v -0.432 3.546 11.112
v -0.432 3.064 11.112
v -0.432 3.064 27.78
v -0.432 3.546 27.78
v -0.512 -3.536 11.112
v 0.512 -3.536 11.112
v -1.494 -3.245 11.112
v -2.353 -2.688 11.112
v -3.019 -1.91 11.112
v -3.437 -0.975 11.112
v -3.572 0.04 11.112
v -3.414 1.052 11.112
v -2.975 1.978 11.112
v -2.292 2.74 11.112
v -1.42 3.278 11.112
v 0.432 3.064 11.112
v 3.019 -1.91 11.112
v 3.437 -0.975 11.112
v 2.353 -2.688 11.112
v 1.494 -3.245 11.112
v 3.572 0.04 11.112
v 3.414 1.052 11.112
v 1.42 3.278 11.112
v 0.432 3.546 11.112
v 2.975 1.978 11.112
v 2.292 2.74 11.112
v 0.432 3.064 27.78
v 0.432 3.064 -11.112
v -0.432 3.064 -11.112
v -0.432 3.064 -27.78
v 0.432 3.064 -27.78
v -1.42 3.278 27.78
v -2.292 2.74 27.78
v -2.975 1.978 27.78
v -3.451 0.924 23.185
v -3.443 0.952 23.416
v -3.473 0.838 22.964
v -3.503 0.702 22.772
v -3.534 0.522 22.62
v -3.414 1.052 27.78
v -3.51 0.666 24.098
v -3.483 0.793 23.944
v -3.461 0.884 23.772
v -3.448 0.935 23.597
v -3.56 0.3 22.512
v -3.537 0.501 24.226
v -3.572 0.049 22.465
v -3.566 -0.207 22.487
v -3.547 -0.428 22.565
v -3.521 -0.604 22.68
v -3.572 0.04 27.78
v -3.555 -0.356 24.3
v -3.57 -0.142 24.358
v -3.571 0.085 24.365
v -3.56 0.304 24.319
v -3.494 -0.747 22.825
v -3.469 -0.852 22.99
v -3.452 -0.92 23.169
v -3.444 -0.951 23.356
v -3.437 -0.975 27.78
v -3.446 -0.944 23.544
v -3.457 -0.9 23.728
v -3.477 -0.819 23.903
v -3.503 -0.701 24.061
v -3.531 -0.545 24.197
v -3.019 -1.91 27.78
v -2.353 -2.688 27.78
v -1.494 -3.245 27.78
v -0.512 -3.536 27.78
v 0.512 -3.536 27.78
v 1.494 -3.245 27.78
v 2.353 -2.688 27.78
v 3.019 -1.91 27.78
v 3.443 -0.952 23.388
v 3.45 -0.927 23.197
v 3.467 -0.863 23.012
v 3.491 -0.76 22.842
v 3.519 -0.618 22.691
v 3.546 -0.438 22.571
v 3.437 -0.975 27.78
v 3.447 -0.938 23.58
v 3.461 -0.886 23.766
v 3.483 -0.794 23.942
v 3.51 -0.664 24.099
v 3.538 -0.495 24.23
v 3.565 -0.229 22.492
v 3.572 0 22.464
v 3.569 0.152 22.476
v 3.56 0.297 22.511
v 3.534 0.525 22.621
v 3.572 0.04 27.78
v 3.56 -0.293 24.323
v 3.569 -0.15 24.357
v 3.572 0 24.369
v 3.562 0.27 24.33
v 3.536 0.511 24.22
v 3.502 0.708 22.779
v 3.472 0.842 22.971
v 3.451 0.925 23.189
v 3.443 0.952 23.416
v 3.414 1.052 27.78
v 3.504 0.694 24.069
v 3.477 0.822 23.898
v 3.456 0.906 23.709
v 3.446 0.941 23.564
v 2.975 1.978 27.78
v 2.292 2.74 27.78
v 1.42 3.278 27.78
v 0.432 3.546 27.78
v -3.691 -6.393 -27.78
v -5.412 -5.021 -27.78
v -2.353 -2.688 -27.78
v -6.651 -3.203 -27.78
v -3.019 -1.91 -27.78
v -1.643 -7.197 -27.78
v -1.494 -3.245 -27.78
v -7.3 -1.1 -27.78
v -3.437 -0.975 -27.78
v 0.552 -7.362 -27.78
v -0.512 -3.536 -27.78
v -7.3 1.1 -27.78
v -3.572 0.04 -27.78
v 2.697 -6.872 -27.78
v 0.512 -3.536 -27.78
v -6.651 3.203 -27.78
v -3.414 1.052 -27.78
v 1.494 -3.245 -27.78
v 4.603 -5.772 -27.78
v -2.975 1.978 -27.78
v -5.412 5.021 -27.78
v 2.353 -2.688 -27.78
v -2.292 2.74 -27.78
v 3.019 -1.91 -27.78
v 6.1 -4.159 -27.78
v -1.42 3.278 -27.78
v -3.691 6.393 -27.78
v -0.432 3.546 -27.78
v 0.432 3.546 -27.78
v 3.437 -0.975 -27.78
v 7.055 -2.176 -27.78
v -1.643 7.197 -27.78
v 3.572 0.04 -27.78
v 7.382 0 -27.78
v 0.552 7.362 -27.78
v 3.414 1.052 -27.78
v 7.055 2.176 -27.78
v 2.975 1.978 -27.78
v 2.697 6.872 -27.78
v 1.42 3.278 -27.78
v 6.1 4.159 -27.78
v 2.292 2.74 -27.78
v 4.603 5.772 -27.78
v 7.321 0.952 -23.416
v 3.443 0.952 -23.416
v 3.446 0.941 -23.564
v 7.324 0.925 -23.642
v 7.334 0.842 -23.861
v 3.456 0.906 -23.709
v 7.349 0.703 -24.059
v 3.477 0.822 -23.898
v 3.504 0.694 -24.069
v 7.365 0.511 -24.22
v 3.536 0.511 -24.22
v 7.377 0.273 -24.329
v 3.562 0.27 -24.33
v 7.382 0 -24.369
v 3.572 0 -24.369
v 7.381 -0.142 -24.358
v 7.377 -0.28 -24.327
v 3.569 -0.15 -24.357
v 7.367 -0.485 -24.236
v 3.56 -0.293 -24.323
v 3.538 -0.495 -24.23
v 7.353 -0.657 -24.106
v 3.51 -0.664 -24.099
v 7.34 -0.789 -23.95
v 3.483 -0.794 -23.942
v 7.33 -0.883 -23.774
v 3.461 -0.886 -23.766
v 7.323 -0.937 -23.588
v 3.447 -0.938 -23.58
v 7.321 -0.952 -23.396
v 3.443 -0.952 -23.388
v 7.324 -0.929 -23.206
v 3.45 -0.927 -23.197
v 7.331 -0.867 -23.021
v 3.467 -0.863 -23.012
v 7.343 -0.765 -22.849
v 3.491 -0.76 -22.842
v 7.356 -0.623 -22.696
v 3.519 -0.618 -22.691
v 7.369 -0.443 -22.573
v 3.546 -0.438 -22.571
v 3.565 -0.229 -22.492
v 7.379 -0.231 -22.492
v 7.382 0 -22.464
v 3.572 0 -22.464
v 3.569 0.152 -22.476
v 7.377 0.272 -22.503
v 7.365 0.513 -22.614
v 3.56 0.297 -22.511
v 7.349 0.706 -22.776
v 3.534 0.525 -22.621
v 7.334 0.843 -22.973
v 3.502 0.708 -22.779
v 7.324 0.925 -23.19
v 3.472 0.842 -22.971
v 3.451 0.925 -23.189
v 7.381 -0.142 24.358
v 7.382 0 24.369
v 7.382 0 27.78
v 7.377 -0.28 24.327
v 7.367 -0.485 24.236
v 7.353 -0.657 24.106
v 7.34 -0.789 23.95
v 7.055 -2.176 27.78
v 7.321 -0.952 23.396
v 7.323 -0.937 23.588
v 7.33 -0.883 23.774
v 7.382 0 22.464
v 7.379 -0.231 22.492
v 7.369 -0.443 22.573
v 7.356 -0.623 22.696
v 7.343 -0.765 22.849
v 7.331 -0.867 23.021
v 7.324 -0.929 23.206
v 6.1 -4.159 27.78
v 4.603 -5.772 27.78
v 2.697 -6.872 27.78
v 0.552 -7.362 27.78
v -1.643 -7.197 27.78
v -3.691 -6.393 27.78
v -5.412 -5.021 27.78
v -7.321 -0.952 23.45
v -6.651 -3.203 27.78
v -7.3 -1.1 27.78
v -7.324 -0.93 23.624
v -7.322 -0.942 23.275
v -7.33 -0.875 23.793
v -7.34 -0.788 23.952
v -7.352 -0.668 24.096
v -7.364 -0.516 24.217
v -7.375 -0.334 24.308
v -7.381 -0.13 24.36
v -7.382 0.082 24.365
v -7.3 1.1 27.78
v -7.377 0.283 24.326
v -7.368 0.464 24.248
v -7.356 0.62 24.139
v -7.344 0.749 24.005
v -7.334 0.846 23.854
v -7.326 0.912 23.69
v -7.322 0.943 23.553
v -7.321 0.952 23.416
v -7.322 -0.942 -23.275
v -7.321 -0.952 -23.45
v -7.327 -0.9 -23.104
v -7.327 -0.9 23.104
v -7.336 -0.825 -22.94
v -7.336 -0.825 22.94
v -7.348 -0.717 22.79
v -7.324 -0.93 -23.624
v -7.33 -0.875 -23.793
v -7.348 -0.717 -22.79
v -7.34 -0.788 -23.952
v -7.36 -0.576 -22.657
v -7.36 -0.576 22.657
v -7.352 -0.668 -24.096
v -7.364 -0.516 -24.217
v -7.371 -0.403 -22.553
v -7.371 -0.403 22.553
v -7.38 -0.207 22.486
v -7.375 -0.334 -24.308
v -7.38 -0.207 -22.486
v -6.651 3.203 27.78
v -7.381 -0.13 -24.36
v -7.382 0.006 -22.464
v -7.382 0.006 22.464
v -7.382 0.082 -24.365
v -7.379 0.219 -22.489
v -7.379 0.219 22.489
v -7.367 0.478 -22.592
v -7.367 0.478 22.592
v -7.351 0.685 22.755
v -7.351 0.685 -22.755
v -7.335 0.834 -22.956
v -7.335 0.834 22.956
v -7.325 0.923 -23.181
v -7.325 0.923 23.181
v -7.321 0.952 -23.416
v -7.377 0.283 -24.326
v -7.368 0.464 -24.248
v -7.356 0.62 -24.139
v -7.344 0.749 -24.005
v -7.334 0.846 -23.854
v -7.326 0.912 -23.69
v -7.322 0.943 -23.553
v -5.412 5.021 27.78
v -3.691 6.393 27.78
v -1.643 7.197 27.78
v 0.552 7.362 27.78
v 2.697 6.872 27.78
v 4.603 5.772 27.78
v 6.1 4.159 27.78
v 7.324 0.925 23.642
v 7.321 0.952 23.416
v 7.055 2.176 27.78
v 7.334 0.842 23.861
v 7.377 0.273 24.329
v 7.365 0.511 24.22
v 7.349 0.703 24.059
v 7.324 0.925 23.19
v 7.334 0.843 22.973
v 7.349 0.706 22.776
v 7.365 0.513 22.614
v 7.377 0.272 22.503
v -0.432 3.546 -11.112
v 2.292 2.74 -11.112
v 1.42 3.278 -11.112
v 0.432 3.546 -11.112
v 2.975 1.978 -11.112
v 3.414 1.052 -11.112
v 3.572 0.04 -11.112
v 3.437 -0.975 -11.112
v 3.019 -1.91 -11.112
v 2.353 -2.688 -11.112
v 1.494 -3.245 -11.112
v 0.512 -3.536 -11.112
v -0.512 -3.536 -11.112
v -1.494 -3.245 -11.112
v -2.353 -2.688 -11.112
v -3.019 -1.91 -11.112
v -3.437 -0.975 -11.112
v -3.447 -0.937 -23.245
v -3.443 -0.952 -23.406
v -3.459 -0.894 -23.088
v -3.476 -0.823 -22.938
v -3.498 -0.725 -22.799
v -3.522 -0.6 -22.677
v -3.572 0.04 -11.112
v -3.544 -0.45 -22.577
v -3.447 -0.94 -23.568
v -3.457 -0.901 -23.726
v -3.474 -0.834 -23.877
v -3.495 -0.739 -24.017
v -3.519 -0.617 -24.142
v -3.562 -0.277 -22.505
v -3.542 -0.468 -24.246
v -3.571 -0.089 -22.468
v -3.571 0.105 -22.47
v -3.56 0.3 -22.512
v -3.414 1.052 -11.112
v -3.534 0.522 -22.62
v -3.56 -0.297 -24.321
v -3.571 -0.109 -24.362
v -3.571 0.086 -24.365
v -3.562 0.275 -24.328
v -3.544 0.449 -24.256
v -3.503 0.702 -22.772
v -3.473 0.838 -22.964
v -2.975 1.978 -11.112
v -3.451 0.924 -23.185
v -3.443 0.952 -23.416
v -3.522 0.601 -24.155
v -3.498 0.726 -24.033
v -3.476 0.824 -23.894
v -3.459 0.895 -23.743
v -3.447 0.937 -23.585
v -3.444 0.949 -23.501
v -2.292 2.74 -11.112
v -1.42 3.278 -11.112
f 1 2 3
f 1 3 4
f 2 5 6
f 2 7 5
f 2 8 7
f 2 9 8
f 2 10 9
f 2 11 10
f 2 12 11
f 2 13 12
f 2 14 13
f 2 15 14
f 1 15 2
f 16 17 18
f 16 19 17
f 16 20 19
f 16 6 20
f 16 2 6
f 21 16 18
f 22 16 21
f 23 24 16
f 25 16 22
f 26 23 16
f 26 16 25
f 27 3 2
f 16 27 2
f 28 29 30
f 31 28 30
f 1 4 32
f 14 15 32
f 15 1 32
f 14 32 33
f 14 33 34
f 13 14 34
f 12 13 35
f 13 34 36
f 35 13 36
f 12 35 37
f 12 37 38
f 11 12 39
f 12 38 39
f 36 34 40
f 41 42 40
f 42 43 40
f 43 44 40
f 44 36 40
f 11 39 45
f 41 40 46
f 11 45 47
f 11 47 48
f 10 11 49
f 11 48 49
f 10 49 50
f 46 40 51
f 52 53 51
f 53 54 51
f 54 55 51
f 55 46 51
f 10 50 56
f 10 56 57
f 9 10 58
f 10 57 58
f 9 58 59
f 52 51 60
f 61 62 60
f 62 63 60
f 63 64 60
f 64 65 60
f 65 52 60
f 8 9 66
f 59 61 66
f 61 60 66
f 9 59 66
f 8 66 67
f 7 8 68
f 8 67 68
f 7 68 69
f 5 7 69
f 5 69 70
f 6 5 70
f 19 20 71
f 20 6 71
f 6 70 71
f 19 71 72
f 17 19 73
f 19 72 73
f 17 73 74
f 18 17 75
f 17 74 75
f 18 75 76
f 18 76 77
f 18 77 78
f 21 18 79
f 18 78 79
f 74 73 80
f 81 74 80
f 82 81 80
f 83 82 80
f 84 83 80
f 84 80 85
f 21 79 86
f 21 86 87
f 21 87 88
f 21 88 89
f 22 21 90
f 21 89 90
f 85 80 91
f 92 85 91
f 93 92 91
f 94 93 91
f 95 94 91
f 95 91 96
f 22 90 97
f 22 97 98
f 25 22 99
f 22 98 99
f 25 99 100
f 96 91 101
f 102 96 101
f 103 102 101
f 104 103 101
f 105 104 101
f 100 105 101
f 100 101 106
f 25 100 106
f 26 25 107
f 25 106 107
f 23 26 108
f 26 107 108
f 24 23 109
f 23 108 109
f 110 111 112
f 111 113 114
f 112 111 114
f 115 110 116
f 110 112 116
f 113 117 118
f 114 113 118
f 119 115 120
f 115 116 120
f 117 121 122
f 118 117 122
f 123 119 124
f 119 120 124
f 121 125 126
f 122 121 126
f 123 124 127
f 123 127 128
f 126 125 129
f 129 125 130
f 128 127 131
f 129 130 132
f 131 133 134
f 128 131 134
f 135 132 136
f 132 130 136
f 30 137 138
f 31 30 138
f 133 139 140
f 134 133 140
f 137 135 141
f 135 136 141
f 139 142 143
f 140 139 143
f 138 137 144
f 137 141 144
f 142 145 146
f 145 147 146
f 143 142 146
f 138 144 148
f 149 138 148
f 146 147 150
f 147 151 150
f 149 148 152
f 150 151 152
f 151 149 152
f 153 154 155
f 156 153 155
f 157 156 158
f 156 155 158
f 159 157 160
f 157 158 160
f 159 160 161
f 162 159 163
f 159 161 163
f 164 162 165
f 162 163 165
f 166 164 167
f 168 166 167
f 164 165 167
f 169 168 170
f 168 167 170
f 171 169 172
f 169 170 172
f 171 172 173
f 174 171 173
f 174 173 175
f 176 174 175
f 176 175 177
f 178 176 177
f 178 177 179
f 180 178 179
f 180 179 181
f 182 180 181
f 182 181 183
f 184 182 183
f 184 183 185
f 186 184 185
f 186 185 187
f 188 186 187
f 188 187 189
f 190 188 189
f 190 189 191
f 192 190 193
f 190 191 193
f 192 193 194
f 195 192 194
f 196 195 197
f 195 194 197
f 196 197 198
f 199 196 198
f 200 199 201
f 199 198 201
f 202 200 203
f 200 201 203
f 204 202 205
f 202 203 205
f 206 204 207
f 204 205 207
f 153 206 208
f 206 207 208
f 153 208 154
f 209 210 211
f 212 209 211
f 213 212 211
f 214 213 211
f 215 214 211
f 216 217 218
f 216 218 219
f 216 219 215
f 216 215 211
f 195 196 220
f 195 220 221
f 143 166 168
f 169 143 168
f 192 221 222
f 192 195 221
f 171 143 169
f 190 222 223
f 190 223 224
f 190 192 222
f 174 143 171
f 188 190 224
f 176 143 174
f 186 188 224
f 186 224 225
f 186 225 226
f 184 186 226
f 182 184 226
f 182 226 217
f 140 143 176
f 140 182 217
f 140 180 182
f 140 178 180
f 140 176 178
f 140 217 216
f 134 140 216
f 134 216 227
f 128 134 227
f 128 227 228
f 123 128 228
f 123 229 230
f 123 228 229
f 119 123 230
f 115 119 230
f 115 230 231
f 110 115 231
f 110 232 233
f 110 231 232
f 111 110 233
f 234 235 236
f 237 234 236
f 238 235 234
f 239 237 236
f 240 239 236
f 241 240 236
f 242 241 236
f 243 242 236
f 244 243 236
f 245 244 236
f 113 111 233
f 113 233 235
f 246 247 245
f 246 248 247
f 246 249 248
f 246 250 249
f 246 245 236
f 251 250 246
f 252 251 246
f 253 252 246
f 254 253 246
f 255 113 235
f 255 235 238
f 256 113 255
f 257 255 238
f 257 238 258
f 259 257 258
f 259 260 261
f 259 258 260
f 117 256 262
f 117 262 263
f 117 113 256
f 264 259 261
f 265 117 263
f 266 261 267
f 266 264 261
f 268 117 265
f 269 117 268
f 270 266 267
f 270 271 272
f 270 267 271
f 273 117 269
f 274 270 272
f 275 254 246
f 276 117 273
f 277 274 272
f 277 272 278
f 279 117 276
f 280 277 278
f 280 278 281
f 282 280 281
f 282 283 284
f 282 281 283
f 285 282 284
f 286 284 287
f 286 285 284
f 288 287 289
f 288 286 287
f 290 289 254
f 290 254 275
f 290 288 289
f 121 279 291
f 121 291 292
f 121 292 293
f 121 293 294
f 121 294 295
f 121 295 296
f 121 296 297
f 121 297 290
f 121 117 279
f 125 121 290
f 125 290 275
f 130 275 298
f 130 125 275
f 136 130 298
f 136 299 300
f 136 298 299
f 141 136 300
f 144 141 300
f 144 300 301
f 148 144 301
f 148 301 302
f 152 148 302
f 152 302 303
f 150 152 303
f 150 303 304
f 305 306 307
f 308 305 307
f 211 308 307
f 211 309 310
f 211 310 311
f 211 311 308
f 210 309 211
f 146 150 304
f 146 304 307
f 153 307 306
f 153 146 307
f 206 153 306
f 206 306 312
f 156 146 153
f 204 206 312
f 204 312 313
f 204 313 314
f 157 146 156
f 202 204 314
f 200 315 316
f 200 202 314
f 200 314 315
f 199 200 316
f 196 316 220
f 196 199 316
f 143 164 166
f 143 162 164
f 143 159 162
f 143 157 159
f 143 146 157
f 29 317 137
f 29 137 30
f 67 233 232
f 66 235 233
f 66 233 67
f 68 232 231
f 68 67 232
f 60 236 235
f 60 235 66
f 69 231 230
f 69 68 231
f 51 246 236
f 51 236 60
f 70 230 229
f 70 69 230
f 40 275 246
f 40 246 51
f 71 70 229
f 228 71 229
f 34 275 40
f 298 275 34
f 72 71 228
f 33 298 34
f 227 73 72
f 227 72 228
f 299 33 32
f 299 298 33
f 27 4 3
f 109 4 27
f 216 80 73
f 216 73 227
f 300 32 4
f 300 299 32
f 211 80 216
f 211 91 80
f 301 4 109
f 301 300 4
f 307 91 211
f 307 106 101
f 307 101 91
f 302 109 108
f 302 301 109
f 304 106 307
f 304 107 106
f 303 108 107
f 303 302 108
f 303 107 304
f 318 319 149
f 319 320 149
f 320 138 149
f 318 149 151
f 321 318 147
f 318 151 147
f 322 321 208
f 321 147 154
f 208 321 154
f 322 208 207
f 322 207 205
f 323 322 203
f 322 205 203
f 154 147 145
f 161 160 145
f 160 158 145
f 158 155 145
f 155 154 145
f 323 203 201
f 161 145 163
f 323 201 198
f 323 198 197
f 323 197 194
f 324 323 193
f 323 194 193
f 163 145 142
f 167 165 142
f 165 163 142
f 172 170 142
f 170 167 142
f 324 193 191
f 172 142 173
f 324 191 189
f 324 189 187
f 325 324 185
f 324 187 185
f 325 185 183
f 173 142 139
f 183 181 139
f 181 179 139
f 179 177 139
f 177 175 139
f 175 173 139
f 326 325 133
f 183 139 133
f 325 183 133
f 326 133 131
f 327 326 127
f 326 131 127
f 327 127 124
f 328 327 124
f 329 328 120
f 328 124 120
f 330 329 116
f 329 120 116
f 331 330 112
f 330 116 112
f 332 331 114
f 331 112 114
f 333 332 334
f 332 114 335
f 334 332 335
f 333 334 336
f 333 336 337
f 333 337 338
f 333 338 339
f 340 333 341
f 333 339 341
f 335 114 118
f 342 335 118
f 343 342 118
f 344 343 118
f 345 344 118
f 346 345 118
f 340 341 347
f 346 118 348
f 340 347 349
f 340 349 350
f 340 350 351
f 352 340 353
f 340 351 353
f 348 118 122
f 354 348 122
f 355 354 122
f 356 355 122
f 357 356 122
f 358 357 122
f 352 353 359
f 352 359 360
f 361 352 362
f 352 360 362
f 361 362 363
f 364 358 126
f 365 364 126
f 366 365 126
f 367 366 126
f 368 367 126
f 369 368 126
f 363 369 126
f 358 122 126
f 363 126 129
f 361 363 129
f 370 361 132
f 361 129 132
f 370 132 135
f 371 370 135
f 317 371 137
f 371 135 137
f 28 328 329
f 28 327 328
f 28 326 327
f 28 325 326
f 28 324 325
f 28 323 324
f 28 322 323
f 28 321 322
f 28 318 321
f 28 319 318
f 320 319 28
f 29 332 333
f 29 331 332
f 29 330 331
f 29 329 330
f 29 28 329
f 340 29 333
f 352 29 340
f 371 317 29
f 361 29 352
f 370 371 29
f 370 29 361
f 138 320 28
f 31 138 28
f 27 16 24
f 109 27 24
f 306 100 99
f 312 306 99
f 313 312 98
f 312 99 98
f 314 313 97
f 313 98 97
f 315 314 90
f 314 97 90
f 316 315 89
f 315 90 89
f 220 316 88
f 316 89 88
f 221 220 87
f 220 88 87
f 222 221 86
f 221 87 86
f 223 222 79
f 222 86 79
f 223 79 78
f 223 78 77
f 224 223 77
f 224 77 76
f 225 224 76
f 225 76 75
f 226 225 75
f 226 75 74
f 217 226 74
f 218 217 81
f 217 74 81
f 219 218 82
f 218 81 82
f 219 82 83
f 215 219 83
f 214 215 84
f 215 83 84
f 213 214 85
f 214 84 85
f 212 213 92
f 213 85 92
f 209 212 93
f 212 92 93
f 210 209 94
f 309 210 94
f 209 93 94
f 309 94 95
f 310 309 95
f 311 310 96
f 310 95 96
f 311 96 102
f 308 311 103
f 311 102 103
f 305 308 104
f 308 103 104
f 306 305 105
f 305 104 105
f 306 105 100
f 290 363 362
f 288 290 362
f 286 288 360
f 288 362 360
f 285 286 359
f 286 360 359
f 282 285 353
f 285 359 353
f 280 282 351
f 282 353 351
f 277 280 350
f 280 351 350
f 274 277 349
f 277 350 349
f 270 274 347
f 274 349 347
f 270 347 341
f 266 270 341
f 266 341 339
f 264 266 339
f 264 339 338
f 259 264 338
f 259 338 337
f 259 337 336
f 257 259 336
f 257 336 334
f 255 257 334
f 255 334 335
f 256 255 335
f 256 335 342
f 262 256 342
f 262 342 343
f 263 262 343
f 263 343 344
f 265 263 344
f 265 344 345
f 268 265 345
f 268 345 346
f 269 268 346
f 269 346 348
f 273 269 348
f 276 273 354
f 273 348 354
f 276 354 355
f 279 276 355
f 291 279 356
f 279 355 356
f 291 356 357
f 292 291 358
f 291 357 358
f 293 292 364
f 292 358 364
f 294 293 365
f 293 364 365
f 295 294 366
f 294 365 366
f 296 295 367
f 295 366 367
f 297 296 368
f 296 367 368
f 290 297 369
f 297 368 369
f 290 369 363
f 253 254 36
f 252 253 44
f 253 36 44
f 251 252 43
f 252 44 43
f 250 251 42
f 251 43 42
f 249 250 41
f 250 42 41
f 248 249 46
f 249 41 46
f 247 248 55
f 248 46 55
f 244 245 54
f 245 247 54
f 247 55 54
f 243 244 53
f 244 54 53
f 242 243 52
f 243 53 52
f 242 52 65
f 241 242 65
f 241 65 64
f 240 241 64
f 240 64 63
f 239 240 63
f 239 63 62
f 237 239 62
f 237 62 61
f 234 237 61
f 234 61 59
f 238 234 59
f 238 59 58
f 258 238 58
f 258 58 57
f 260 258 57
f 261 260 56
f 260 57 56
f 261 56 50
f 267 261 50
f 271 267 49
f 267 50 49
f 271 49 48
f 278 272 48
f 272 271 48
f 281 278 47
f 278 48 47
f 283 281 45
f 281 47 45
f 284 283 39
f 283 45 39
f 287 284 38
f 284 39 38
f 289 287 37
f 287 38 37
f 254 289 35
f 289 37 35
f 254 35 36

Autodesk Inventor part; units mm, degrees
ref_plane "YZ Plane" through (0, 0, 0) normal (1, 0, 0) x (0, 1, 0)
ref_plane "XZ Plane" through (0, 0, 0) normal (0, 1, 0) x (-1, 0, 0)
ref_plane "XY Plane" through (0, 0, 0) normal (0, 0, 1) x (1, 0, 0)
sketch "Sketch1" plane through (0, 0, 0) normal (0, 0, 1) x (1, 0, 0)
  circle A0 centre (0, 0) radius 7.3825
  dimension "d0" = 14.765
extrude "Extrusion1" add sketch "Sketch1" along normal mid plane 55.56
sketch "Sketch3" plane through (0, 0, 27.78) normal (0, 0, 1) x (1, 0, 0)
  circle A0 centre (0, 0) radius 3.5725
  dimension "d6" = 7.145
extrude "Extrusion2" cut sketch "Sketch3" against normal blind 16.6675
sketch "Sketch4" plane through (0, 0, 0) normal (1, 0, 0) x (0, 1, 0)
  circle A0 centre (0, -23.4163) radius 0.9525
  point P0 (0, 0)
  dimension "d9" = 23.4163
  dimension "d10" = 1.905
extrude "Extrusion3" cut sketch "Sketch4" along normal through all both and the other way through all
sketch "Sketch6" plane through (0, 0, 0) normal (1, 0, 0) x (0, 1, 0)
  line L0 (-3.5725, 27.78) -> (3.5725, 27.78) projected
  line L1 (-3.5725, 11.1125) -> (3.5725, 11.1125) projected
  line L2 (3.5725, 27.78) -> (3.0645, 27.78)
  line L3 (3.0645, 27.78) -> (3.0645, 11.1125)
  line L4 (3.0645, 11.1125) -> (3.5725, 11.1125)
  line L5 (3.5725, 11.1125) -> (3.5725, 27.78)
  point P0 (0, 0)
  dimension "d17" = 0.508
extrude "Extrusion5" add sketch "Sketch6" along normal mid plane 0.8636
mirror "Mirror5" about plane through (0, 0, 0) normal (0, 0, 1) of "Extrusion5", "Extrusion3", "Extrusion2"
properties part number "Wheel_axis_3DPrint"
